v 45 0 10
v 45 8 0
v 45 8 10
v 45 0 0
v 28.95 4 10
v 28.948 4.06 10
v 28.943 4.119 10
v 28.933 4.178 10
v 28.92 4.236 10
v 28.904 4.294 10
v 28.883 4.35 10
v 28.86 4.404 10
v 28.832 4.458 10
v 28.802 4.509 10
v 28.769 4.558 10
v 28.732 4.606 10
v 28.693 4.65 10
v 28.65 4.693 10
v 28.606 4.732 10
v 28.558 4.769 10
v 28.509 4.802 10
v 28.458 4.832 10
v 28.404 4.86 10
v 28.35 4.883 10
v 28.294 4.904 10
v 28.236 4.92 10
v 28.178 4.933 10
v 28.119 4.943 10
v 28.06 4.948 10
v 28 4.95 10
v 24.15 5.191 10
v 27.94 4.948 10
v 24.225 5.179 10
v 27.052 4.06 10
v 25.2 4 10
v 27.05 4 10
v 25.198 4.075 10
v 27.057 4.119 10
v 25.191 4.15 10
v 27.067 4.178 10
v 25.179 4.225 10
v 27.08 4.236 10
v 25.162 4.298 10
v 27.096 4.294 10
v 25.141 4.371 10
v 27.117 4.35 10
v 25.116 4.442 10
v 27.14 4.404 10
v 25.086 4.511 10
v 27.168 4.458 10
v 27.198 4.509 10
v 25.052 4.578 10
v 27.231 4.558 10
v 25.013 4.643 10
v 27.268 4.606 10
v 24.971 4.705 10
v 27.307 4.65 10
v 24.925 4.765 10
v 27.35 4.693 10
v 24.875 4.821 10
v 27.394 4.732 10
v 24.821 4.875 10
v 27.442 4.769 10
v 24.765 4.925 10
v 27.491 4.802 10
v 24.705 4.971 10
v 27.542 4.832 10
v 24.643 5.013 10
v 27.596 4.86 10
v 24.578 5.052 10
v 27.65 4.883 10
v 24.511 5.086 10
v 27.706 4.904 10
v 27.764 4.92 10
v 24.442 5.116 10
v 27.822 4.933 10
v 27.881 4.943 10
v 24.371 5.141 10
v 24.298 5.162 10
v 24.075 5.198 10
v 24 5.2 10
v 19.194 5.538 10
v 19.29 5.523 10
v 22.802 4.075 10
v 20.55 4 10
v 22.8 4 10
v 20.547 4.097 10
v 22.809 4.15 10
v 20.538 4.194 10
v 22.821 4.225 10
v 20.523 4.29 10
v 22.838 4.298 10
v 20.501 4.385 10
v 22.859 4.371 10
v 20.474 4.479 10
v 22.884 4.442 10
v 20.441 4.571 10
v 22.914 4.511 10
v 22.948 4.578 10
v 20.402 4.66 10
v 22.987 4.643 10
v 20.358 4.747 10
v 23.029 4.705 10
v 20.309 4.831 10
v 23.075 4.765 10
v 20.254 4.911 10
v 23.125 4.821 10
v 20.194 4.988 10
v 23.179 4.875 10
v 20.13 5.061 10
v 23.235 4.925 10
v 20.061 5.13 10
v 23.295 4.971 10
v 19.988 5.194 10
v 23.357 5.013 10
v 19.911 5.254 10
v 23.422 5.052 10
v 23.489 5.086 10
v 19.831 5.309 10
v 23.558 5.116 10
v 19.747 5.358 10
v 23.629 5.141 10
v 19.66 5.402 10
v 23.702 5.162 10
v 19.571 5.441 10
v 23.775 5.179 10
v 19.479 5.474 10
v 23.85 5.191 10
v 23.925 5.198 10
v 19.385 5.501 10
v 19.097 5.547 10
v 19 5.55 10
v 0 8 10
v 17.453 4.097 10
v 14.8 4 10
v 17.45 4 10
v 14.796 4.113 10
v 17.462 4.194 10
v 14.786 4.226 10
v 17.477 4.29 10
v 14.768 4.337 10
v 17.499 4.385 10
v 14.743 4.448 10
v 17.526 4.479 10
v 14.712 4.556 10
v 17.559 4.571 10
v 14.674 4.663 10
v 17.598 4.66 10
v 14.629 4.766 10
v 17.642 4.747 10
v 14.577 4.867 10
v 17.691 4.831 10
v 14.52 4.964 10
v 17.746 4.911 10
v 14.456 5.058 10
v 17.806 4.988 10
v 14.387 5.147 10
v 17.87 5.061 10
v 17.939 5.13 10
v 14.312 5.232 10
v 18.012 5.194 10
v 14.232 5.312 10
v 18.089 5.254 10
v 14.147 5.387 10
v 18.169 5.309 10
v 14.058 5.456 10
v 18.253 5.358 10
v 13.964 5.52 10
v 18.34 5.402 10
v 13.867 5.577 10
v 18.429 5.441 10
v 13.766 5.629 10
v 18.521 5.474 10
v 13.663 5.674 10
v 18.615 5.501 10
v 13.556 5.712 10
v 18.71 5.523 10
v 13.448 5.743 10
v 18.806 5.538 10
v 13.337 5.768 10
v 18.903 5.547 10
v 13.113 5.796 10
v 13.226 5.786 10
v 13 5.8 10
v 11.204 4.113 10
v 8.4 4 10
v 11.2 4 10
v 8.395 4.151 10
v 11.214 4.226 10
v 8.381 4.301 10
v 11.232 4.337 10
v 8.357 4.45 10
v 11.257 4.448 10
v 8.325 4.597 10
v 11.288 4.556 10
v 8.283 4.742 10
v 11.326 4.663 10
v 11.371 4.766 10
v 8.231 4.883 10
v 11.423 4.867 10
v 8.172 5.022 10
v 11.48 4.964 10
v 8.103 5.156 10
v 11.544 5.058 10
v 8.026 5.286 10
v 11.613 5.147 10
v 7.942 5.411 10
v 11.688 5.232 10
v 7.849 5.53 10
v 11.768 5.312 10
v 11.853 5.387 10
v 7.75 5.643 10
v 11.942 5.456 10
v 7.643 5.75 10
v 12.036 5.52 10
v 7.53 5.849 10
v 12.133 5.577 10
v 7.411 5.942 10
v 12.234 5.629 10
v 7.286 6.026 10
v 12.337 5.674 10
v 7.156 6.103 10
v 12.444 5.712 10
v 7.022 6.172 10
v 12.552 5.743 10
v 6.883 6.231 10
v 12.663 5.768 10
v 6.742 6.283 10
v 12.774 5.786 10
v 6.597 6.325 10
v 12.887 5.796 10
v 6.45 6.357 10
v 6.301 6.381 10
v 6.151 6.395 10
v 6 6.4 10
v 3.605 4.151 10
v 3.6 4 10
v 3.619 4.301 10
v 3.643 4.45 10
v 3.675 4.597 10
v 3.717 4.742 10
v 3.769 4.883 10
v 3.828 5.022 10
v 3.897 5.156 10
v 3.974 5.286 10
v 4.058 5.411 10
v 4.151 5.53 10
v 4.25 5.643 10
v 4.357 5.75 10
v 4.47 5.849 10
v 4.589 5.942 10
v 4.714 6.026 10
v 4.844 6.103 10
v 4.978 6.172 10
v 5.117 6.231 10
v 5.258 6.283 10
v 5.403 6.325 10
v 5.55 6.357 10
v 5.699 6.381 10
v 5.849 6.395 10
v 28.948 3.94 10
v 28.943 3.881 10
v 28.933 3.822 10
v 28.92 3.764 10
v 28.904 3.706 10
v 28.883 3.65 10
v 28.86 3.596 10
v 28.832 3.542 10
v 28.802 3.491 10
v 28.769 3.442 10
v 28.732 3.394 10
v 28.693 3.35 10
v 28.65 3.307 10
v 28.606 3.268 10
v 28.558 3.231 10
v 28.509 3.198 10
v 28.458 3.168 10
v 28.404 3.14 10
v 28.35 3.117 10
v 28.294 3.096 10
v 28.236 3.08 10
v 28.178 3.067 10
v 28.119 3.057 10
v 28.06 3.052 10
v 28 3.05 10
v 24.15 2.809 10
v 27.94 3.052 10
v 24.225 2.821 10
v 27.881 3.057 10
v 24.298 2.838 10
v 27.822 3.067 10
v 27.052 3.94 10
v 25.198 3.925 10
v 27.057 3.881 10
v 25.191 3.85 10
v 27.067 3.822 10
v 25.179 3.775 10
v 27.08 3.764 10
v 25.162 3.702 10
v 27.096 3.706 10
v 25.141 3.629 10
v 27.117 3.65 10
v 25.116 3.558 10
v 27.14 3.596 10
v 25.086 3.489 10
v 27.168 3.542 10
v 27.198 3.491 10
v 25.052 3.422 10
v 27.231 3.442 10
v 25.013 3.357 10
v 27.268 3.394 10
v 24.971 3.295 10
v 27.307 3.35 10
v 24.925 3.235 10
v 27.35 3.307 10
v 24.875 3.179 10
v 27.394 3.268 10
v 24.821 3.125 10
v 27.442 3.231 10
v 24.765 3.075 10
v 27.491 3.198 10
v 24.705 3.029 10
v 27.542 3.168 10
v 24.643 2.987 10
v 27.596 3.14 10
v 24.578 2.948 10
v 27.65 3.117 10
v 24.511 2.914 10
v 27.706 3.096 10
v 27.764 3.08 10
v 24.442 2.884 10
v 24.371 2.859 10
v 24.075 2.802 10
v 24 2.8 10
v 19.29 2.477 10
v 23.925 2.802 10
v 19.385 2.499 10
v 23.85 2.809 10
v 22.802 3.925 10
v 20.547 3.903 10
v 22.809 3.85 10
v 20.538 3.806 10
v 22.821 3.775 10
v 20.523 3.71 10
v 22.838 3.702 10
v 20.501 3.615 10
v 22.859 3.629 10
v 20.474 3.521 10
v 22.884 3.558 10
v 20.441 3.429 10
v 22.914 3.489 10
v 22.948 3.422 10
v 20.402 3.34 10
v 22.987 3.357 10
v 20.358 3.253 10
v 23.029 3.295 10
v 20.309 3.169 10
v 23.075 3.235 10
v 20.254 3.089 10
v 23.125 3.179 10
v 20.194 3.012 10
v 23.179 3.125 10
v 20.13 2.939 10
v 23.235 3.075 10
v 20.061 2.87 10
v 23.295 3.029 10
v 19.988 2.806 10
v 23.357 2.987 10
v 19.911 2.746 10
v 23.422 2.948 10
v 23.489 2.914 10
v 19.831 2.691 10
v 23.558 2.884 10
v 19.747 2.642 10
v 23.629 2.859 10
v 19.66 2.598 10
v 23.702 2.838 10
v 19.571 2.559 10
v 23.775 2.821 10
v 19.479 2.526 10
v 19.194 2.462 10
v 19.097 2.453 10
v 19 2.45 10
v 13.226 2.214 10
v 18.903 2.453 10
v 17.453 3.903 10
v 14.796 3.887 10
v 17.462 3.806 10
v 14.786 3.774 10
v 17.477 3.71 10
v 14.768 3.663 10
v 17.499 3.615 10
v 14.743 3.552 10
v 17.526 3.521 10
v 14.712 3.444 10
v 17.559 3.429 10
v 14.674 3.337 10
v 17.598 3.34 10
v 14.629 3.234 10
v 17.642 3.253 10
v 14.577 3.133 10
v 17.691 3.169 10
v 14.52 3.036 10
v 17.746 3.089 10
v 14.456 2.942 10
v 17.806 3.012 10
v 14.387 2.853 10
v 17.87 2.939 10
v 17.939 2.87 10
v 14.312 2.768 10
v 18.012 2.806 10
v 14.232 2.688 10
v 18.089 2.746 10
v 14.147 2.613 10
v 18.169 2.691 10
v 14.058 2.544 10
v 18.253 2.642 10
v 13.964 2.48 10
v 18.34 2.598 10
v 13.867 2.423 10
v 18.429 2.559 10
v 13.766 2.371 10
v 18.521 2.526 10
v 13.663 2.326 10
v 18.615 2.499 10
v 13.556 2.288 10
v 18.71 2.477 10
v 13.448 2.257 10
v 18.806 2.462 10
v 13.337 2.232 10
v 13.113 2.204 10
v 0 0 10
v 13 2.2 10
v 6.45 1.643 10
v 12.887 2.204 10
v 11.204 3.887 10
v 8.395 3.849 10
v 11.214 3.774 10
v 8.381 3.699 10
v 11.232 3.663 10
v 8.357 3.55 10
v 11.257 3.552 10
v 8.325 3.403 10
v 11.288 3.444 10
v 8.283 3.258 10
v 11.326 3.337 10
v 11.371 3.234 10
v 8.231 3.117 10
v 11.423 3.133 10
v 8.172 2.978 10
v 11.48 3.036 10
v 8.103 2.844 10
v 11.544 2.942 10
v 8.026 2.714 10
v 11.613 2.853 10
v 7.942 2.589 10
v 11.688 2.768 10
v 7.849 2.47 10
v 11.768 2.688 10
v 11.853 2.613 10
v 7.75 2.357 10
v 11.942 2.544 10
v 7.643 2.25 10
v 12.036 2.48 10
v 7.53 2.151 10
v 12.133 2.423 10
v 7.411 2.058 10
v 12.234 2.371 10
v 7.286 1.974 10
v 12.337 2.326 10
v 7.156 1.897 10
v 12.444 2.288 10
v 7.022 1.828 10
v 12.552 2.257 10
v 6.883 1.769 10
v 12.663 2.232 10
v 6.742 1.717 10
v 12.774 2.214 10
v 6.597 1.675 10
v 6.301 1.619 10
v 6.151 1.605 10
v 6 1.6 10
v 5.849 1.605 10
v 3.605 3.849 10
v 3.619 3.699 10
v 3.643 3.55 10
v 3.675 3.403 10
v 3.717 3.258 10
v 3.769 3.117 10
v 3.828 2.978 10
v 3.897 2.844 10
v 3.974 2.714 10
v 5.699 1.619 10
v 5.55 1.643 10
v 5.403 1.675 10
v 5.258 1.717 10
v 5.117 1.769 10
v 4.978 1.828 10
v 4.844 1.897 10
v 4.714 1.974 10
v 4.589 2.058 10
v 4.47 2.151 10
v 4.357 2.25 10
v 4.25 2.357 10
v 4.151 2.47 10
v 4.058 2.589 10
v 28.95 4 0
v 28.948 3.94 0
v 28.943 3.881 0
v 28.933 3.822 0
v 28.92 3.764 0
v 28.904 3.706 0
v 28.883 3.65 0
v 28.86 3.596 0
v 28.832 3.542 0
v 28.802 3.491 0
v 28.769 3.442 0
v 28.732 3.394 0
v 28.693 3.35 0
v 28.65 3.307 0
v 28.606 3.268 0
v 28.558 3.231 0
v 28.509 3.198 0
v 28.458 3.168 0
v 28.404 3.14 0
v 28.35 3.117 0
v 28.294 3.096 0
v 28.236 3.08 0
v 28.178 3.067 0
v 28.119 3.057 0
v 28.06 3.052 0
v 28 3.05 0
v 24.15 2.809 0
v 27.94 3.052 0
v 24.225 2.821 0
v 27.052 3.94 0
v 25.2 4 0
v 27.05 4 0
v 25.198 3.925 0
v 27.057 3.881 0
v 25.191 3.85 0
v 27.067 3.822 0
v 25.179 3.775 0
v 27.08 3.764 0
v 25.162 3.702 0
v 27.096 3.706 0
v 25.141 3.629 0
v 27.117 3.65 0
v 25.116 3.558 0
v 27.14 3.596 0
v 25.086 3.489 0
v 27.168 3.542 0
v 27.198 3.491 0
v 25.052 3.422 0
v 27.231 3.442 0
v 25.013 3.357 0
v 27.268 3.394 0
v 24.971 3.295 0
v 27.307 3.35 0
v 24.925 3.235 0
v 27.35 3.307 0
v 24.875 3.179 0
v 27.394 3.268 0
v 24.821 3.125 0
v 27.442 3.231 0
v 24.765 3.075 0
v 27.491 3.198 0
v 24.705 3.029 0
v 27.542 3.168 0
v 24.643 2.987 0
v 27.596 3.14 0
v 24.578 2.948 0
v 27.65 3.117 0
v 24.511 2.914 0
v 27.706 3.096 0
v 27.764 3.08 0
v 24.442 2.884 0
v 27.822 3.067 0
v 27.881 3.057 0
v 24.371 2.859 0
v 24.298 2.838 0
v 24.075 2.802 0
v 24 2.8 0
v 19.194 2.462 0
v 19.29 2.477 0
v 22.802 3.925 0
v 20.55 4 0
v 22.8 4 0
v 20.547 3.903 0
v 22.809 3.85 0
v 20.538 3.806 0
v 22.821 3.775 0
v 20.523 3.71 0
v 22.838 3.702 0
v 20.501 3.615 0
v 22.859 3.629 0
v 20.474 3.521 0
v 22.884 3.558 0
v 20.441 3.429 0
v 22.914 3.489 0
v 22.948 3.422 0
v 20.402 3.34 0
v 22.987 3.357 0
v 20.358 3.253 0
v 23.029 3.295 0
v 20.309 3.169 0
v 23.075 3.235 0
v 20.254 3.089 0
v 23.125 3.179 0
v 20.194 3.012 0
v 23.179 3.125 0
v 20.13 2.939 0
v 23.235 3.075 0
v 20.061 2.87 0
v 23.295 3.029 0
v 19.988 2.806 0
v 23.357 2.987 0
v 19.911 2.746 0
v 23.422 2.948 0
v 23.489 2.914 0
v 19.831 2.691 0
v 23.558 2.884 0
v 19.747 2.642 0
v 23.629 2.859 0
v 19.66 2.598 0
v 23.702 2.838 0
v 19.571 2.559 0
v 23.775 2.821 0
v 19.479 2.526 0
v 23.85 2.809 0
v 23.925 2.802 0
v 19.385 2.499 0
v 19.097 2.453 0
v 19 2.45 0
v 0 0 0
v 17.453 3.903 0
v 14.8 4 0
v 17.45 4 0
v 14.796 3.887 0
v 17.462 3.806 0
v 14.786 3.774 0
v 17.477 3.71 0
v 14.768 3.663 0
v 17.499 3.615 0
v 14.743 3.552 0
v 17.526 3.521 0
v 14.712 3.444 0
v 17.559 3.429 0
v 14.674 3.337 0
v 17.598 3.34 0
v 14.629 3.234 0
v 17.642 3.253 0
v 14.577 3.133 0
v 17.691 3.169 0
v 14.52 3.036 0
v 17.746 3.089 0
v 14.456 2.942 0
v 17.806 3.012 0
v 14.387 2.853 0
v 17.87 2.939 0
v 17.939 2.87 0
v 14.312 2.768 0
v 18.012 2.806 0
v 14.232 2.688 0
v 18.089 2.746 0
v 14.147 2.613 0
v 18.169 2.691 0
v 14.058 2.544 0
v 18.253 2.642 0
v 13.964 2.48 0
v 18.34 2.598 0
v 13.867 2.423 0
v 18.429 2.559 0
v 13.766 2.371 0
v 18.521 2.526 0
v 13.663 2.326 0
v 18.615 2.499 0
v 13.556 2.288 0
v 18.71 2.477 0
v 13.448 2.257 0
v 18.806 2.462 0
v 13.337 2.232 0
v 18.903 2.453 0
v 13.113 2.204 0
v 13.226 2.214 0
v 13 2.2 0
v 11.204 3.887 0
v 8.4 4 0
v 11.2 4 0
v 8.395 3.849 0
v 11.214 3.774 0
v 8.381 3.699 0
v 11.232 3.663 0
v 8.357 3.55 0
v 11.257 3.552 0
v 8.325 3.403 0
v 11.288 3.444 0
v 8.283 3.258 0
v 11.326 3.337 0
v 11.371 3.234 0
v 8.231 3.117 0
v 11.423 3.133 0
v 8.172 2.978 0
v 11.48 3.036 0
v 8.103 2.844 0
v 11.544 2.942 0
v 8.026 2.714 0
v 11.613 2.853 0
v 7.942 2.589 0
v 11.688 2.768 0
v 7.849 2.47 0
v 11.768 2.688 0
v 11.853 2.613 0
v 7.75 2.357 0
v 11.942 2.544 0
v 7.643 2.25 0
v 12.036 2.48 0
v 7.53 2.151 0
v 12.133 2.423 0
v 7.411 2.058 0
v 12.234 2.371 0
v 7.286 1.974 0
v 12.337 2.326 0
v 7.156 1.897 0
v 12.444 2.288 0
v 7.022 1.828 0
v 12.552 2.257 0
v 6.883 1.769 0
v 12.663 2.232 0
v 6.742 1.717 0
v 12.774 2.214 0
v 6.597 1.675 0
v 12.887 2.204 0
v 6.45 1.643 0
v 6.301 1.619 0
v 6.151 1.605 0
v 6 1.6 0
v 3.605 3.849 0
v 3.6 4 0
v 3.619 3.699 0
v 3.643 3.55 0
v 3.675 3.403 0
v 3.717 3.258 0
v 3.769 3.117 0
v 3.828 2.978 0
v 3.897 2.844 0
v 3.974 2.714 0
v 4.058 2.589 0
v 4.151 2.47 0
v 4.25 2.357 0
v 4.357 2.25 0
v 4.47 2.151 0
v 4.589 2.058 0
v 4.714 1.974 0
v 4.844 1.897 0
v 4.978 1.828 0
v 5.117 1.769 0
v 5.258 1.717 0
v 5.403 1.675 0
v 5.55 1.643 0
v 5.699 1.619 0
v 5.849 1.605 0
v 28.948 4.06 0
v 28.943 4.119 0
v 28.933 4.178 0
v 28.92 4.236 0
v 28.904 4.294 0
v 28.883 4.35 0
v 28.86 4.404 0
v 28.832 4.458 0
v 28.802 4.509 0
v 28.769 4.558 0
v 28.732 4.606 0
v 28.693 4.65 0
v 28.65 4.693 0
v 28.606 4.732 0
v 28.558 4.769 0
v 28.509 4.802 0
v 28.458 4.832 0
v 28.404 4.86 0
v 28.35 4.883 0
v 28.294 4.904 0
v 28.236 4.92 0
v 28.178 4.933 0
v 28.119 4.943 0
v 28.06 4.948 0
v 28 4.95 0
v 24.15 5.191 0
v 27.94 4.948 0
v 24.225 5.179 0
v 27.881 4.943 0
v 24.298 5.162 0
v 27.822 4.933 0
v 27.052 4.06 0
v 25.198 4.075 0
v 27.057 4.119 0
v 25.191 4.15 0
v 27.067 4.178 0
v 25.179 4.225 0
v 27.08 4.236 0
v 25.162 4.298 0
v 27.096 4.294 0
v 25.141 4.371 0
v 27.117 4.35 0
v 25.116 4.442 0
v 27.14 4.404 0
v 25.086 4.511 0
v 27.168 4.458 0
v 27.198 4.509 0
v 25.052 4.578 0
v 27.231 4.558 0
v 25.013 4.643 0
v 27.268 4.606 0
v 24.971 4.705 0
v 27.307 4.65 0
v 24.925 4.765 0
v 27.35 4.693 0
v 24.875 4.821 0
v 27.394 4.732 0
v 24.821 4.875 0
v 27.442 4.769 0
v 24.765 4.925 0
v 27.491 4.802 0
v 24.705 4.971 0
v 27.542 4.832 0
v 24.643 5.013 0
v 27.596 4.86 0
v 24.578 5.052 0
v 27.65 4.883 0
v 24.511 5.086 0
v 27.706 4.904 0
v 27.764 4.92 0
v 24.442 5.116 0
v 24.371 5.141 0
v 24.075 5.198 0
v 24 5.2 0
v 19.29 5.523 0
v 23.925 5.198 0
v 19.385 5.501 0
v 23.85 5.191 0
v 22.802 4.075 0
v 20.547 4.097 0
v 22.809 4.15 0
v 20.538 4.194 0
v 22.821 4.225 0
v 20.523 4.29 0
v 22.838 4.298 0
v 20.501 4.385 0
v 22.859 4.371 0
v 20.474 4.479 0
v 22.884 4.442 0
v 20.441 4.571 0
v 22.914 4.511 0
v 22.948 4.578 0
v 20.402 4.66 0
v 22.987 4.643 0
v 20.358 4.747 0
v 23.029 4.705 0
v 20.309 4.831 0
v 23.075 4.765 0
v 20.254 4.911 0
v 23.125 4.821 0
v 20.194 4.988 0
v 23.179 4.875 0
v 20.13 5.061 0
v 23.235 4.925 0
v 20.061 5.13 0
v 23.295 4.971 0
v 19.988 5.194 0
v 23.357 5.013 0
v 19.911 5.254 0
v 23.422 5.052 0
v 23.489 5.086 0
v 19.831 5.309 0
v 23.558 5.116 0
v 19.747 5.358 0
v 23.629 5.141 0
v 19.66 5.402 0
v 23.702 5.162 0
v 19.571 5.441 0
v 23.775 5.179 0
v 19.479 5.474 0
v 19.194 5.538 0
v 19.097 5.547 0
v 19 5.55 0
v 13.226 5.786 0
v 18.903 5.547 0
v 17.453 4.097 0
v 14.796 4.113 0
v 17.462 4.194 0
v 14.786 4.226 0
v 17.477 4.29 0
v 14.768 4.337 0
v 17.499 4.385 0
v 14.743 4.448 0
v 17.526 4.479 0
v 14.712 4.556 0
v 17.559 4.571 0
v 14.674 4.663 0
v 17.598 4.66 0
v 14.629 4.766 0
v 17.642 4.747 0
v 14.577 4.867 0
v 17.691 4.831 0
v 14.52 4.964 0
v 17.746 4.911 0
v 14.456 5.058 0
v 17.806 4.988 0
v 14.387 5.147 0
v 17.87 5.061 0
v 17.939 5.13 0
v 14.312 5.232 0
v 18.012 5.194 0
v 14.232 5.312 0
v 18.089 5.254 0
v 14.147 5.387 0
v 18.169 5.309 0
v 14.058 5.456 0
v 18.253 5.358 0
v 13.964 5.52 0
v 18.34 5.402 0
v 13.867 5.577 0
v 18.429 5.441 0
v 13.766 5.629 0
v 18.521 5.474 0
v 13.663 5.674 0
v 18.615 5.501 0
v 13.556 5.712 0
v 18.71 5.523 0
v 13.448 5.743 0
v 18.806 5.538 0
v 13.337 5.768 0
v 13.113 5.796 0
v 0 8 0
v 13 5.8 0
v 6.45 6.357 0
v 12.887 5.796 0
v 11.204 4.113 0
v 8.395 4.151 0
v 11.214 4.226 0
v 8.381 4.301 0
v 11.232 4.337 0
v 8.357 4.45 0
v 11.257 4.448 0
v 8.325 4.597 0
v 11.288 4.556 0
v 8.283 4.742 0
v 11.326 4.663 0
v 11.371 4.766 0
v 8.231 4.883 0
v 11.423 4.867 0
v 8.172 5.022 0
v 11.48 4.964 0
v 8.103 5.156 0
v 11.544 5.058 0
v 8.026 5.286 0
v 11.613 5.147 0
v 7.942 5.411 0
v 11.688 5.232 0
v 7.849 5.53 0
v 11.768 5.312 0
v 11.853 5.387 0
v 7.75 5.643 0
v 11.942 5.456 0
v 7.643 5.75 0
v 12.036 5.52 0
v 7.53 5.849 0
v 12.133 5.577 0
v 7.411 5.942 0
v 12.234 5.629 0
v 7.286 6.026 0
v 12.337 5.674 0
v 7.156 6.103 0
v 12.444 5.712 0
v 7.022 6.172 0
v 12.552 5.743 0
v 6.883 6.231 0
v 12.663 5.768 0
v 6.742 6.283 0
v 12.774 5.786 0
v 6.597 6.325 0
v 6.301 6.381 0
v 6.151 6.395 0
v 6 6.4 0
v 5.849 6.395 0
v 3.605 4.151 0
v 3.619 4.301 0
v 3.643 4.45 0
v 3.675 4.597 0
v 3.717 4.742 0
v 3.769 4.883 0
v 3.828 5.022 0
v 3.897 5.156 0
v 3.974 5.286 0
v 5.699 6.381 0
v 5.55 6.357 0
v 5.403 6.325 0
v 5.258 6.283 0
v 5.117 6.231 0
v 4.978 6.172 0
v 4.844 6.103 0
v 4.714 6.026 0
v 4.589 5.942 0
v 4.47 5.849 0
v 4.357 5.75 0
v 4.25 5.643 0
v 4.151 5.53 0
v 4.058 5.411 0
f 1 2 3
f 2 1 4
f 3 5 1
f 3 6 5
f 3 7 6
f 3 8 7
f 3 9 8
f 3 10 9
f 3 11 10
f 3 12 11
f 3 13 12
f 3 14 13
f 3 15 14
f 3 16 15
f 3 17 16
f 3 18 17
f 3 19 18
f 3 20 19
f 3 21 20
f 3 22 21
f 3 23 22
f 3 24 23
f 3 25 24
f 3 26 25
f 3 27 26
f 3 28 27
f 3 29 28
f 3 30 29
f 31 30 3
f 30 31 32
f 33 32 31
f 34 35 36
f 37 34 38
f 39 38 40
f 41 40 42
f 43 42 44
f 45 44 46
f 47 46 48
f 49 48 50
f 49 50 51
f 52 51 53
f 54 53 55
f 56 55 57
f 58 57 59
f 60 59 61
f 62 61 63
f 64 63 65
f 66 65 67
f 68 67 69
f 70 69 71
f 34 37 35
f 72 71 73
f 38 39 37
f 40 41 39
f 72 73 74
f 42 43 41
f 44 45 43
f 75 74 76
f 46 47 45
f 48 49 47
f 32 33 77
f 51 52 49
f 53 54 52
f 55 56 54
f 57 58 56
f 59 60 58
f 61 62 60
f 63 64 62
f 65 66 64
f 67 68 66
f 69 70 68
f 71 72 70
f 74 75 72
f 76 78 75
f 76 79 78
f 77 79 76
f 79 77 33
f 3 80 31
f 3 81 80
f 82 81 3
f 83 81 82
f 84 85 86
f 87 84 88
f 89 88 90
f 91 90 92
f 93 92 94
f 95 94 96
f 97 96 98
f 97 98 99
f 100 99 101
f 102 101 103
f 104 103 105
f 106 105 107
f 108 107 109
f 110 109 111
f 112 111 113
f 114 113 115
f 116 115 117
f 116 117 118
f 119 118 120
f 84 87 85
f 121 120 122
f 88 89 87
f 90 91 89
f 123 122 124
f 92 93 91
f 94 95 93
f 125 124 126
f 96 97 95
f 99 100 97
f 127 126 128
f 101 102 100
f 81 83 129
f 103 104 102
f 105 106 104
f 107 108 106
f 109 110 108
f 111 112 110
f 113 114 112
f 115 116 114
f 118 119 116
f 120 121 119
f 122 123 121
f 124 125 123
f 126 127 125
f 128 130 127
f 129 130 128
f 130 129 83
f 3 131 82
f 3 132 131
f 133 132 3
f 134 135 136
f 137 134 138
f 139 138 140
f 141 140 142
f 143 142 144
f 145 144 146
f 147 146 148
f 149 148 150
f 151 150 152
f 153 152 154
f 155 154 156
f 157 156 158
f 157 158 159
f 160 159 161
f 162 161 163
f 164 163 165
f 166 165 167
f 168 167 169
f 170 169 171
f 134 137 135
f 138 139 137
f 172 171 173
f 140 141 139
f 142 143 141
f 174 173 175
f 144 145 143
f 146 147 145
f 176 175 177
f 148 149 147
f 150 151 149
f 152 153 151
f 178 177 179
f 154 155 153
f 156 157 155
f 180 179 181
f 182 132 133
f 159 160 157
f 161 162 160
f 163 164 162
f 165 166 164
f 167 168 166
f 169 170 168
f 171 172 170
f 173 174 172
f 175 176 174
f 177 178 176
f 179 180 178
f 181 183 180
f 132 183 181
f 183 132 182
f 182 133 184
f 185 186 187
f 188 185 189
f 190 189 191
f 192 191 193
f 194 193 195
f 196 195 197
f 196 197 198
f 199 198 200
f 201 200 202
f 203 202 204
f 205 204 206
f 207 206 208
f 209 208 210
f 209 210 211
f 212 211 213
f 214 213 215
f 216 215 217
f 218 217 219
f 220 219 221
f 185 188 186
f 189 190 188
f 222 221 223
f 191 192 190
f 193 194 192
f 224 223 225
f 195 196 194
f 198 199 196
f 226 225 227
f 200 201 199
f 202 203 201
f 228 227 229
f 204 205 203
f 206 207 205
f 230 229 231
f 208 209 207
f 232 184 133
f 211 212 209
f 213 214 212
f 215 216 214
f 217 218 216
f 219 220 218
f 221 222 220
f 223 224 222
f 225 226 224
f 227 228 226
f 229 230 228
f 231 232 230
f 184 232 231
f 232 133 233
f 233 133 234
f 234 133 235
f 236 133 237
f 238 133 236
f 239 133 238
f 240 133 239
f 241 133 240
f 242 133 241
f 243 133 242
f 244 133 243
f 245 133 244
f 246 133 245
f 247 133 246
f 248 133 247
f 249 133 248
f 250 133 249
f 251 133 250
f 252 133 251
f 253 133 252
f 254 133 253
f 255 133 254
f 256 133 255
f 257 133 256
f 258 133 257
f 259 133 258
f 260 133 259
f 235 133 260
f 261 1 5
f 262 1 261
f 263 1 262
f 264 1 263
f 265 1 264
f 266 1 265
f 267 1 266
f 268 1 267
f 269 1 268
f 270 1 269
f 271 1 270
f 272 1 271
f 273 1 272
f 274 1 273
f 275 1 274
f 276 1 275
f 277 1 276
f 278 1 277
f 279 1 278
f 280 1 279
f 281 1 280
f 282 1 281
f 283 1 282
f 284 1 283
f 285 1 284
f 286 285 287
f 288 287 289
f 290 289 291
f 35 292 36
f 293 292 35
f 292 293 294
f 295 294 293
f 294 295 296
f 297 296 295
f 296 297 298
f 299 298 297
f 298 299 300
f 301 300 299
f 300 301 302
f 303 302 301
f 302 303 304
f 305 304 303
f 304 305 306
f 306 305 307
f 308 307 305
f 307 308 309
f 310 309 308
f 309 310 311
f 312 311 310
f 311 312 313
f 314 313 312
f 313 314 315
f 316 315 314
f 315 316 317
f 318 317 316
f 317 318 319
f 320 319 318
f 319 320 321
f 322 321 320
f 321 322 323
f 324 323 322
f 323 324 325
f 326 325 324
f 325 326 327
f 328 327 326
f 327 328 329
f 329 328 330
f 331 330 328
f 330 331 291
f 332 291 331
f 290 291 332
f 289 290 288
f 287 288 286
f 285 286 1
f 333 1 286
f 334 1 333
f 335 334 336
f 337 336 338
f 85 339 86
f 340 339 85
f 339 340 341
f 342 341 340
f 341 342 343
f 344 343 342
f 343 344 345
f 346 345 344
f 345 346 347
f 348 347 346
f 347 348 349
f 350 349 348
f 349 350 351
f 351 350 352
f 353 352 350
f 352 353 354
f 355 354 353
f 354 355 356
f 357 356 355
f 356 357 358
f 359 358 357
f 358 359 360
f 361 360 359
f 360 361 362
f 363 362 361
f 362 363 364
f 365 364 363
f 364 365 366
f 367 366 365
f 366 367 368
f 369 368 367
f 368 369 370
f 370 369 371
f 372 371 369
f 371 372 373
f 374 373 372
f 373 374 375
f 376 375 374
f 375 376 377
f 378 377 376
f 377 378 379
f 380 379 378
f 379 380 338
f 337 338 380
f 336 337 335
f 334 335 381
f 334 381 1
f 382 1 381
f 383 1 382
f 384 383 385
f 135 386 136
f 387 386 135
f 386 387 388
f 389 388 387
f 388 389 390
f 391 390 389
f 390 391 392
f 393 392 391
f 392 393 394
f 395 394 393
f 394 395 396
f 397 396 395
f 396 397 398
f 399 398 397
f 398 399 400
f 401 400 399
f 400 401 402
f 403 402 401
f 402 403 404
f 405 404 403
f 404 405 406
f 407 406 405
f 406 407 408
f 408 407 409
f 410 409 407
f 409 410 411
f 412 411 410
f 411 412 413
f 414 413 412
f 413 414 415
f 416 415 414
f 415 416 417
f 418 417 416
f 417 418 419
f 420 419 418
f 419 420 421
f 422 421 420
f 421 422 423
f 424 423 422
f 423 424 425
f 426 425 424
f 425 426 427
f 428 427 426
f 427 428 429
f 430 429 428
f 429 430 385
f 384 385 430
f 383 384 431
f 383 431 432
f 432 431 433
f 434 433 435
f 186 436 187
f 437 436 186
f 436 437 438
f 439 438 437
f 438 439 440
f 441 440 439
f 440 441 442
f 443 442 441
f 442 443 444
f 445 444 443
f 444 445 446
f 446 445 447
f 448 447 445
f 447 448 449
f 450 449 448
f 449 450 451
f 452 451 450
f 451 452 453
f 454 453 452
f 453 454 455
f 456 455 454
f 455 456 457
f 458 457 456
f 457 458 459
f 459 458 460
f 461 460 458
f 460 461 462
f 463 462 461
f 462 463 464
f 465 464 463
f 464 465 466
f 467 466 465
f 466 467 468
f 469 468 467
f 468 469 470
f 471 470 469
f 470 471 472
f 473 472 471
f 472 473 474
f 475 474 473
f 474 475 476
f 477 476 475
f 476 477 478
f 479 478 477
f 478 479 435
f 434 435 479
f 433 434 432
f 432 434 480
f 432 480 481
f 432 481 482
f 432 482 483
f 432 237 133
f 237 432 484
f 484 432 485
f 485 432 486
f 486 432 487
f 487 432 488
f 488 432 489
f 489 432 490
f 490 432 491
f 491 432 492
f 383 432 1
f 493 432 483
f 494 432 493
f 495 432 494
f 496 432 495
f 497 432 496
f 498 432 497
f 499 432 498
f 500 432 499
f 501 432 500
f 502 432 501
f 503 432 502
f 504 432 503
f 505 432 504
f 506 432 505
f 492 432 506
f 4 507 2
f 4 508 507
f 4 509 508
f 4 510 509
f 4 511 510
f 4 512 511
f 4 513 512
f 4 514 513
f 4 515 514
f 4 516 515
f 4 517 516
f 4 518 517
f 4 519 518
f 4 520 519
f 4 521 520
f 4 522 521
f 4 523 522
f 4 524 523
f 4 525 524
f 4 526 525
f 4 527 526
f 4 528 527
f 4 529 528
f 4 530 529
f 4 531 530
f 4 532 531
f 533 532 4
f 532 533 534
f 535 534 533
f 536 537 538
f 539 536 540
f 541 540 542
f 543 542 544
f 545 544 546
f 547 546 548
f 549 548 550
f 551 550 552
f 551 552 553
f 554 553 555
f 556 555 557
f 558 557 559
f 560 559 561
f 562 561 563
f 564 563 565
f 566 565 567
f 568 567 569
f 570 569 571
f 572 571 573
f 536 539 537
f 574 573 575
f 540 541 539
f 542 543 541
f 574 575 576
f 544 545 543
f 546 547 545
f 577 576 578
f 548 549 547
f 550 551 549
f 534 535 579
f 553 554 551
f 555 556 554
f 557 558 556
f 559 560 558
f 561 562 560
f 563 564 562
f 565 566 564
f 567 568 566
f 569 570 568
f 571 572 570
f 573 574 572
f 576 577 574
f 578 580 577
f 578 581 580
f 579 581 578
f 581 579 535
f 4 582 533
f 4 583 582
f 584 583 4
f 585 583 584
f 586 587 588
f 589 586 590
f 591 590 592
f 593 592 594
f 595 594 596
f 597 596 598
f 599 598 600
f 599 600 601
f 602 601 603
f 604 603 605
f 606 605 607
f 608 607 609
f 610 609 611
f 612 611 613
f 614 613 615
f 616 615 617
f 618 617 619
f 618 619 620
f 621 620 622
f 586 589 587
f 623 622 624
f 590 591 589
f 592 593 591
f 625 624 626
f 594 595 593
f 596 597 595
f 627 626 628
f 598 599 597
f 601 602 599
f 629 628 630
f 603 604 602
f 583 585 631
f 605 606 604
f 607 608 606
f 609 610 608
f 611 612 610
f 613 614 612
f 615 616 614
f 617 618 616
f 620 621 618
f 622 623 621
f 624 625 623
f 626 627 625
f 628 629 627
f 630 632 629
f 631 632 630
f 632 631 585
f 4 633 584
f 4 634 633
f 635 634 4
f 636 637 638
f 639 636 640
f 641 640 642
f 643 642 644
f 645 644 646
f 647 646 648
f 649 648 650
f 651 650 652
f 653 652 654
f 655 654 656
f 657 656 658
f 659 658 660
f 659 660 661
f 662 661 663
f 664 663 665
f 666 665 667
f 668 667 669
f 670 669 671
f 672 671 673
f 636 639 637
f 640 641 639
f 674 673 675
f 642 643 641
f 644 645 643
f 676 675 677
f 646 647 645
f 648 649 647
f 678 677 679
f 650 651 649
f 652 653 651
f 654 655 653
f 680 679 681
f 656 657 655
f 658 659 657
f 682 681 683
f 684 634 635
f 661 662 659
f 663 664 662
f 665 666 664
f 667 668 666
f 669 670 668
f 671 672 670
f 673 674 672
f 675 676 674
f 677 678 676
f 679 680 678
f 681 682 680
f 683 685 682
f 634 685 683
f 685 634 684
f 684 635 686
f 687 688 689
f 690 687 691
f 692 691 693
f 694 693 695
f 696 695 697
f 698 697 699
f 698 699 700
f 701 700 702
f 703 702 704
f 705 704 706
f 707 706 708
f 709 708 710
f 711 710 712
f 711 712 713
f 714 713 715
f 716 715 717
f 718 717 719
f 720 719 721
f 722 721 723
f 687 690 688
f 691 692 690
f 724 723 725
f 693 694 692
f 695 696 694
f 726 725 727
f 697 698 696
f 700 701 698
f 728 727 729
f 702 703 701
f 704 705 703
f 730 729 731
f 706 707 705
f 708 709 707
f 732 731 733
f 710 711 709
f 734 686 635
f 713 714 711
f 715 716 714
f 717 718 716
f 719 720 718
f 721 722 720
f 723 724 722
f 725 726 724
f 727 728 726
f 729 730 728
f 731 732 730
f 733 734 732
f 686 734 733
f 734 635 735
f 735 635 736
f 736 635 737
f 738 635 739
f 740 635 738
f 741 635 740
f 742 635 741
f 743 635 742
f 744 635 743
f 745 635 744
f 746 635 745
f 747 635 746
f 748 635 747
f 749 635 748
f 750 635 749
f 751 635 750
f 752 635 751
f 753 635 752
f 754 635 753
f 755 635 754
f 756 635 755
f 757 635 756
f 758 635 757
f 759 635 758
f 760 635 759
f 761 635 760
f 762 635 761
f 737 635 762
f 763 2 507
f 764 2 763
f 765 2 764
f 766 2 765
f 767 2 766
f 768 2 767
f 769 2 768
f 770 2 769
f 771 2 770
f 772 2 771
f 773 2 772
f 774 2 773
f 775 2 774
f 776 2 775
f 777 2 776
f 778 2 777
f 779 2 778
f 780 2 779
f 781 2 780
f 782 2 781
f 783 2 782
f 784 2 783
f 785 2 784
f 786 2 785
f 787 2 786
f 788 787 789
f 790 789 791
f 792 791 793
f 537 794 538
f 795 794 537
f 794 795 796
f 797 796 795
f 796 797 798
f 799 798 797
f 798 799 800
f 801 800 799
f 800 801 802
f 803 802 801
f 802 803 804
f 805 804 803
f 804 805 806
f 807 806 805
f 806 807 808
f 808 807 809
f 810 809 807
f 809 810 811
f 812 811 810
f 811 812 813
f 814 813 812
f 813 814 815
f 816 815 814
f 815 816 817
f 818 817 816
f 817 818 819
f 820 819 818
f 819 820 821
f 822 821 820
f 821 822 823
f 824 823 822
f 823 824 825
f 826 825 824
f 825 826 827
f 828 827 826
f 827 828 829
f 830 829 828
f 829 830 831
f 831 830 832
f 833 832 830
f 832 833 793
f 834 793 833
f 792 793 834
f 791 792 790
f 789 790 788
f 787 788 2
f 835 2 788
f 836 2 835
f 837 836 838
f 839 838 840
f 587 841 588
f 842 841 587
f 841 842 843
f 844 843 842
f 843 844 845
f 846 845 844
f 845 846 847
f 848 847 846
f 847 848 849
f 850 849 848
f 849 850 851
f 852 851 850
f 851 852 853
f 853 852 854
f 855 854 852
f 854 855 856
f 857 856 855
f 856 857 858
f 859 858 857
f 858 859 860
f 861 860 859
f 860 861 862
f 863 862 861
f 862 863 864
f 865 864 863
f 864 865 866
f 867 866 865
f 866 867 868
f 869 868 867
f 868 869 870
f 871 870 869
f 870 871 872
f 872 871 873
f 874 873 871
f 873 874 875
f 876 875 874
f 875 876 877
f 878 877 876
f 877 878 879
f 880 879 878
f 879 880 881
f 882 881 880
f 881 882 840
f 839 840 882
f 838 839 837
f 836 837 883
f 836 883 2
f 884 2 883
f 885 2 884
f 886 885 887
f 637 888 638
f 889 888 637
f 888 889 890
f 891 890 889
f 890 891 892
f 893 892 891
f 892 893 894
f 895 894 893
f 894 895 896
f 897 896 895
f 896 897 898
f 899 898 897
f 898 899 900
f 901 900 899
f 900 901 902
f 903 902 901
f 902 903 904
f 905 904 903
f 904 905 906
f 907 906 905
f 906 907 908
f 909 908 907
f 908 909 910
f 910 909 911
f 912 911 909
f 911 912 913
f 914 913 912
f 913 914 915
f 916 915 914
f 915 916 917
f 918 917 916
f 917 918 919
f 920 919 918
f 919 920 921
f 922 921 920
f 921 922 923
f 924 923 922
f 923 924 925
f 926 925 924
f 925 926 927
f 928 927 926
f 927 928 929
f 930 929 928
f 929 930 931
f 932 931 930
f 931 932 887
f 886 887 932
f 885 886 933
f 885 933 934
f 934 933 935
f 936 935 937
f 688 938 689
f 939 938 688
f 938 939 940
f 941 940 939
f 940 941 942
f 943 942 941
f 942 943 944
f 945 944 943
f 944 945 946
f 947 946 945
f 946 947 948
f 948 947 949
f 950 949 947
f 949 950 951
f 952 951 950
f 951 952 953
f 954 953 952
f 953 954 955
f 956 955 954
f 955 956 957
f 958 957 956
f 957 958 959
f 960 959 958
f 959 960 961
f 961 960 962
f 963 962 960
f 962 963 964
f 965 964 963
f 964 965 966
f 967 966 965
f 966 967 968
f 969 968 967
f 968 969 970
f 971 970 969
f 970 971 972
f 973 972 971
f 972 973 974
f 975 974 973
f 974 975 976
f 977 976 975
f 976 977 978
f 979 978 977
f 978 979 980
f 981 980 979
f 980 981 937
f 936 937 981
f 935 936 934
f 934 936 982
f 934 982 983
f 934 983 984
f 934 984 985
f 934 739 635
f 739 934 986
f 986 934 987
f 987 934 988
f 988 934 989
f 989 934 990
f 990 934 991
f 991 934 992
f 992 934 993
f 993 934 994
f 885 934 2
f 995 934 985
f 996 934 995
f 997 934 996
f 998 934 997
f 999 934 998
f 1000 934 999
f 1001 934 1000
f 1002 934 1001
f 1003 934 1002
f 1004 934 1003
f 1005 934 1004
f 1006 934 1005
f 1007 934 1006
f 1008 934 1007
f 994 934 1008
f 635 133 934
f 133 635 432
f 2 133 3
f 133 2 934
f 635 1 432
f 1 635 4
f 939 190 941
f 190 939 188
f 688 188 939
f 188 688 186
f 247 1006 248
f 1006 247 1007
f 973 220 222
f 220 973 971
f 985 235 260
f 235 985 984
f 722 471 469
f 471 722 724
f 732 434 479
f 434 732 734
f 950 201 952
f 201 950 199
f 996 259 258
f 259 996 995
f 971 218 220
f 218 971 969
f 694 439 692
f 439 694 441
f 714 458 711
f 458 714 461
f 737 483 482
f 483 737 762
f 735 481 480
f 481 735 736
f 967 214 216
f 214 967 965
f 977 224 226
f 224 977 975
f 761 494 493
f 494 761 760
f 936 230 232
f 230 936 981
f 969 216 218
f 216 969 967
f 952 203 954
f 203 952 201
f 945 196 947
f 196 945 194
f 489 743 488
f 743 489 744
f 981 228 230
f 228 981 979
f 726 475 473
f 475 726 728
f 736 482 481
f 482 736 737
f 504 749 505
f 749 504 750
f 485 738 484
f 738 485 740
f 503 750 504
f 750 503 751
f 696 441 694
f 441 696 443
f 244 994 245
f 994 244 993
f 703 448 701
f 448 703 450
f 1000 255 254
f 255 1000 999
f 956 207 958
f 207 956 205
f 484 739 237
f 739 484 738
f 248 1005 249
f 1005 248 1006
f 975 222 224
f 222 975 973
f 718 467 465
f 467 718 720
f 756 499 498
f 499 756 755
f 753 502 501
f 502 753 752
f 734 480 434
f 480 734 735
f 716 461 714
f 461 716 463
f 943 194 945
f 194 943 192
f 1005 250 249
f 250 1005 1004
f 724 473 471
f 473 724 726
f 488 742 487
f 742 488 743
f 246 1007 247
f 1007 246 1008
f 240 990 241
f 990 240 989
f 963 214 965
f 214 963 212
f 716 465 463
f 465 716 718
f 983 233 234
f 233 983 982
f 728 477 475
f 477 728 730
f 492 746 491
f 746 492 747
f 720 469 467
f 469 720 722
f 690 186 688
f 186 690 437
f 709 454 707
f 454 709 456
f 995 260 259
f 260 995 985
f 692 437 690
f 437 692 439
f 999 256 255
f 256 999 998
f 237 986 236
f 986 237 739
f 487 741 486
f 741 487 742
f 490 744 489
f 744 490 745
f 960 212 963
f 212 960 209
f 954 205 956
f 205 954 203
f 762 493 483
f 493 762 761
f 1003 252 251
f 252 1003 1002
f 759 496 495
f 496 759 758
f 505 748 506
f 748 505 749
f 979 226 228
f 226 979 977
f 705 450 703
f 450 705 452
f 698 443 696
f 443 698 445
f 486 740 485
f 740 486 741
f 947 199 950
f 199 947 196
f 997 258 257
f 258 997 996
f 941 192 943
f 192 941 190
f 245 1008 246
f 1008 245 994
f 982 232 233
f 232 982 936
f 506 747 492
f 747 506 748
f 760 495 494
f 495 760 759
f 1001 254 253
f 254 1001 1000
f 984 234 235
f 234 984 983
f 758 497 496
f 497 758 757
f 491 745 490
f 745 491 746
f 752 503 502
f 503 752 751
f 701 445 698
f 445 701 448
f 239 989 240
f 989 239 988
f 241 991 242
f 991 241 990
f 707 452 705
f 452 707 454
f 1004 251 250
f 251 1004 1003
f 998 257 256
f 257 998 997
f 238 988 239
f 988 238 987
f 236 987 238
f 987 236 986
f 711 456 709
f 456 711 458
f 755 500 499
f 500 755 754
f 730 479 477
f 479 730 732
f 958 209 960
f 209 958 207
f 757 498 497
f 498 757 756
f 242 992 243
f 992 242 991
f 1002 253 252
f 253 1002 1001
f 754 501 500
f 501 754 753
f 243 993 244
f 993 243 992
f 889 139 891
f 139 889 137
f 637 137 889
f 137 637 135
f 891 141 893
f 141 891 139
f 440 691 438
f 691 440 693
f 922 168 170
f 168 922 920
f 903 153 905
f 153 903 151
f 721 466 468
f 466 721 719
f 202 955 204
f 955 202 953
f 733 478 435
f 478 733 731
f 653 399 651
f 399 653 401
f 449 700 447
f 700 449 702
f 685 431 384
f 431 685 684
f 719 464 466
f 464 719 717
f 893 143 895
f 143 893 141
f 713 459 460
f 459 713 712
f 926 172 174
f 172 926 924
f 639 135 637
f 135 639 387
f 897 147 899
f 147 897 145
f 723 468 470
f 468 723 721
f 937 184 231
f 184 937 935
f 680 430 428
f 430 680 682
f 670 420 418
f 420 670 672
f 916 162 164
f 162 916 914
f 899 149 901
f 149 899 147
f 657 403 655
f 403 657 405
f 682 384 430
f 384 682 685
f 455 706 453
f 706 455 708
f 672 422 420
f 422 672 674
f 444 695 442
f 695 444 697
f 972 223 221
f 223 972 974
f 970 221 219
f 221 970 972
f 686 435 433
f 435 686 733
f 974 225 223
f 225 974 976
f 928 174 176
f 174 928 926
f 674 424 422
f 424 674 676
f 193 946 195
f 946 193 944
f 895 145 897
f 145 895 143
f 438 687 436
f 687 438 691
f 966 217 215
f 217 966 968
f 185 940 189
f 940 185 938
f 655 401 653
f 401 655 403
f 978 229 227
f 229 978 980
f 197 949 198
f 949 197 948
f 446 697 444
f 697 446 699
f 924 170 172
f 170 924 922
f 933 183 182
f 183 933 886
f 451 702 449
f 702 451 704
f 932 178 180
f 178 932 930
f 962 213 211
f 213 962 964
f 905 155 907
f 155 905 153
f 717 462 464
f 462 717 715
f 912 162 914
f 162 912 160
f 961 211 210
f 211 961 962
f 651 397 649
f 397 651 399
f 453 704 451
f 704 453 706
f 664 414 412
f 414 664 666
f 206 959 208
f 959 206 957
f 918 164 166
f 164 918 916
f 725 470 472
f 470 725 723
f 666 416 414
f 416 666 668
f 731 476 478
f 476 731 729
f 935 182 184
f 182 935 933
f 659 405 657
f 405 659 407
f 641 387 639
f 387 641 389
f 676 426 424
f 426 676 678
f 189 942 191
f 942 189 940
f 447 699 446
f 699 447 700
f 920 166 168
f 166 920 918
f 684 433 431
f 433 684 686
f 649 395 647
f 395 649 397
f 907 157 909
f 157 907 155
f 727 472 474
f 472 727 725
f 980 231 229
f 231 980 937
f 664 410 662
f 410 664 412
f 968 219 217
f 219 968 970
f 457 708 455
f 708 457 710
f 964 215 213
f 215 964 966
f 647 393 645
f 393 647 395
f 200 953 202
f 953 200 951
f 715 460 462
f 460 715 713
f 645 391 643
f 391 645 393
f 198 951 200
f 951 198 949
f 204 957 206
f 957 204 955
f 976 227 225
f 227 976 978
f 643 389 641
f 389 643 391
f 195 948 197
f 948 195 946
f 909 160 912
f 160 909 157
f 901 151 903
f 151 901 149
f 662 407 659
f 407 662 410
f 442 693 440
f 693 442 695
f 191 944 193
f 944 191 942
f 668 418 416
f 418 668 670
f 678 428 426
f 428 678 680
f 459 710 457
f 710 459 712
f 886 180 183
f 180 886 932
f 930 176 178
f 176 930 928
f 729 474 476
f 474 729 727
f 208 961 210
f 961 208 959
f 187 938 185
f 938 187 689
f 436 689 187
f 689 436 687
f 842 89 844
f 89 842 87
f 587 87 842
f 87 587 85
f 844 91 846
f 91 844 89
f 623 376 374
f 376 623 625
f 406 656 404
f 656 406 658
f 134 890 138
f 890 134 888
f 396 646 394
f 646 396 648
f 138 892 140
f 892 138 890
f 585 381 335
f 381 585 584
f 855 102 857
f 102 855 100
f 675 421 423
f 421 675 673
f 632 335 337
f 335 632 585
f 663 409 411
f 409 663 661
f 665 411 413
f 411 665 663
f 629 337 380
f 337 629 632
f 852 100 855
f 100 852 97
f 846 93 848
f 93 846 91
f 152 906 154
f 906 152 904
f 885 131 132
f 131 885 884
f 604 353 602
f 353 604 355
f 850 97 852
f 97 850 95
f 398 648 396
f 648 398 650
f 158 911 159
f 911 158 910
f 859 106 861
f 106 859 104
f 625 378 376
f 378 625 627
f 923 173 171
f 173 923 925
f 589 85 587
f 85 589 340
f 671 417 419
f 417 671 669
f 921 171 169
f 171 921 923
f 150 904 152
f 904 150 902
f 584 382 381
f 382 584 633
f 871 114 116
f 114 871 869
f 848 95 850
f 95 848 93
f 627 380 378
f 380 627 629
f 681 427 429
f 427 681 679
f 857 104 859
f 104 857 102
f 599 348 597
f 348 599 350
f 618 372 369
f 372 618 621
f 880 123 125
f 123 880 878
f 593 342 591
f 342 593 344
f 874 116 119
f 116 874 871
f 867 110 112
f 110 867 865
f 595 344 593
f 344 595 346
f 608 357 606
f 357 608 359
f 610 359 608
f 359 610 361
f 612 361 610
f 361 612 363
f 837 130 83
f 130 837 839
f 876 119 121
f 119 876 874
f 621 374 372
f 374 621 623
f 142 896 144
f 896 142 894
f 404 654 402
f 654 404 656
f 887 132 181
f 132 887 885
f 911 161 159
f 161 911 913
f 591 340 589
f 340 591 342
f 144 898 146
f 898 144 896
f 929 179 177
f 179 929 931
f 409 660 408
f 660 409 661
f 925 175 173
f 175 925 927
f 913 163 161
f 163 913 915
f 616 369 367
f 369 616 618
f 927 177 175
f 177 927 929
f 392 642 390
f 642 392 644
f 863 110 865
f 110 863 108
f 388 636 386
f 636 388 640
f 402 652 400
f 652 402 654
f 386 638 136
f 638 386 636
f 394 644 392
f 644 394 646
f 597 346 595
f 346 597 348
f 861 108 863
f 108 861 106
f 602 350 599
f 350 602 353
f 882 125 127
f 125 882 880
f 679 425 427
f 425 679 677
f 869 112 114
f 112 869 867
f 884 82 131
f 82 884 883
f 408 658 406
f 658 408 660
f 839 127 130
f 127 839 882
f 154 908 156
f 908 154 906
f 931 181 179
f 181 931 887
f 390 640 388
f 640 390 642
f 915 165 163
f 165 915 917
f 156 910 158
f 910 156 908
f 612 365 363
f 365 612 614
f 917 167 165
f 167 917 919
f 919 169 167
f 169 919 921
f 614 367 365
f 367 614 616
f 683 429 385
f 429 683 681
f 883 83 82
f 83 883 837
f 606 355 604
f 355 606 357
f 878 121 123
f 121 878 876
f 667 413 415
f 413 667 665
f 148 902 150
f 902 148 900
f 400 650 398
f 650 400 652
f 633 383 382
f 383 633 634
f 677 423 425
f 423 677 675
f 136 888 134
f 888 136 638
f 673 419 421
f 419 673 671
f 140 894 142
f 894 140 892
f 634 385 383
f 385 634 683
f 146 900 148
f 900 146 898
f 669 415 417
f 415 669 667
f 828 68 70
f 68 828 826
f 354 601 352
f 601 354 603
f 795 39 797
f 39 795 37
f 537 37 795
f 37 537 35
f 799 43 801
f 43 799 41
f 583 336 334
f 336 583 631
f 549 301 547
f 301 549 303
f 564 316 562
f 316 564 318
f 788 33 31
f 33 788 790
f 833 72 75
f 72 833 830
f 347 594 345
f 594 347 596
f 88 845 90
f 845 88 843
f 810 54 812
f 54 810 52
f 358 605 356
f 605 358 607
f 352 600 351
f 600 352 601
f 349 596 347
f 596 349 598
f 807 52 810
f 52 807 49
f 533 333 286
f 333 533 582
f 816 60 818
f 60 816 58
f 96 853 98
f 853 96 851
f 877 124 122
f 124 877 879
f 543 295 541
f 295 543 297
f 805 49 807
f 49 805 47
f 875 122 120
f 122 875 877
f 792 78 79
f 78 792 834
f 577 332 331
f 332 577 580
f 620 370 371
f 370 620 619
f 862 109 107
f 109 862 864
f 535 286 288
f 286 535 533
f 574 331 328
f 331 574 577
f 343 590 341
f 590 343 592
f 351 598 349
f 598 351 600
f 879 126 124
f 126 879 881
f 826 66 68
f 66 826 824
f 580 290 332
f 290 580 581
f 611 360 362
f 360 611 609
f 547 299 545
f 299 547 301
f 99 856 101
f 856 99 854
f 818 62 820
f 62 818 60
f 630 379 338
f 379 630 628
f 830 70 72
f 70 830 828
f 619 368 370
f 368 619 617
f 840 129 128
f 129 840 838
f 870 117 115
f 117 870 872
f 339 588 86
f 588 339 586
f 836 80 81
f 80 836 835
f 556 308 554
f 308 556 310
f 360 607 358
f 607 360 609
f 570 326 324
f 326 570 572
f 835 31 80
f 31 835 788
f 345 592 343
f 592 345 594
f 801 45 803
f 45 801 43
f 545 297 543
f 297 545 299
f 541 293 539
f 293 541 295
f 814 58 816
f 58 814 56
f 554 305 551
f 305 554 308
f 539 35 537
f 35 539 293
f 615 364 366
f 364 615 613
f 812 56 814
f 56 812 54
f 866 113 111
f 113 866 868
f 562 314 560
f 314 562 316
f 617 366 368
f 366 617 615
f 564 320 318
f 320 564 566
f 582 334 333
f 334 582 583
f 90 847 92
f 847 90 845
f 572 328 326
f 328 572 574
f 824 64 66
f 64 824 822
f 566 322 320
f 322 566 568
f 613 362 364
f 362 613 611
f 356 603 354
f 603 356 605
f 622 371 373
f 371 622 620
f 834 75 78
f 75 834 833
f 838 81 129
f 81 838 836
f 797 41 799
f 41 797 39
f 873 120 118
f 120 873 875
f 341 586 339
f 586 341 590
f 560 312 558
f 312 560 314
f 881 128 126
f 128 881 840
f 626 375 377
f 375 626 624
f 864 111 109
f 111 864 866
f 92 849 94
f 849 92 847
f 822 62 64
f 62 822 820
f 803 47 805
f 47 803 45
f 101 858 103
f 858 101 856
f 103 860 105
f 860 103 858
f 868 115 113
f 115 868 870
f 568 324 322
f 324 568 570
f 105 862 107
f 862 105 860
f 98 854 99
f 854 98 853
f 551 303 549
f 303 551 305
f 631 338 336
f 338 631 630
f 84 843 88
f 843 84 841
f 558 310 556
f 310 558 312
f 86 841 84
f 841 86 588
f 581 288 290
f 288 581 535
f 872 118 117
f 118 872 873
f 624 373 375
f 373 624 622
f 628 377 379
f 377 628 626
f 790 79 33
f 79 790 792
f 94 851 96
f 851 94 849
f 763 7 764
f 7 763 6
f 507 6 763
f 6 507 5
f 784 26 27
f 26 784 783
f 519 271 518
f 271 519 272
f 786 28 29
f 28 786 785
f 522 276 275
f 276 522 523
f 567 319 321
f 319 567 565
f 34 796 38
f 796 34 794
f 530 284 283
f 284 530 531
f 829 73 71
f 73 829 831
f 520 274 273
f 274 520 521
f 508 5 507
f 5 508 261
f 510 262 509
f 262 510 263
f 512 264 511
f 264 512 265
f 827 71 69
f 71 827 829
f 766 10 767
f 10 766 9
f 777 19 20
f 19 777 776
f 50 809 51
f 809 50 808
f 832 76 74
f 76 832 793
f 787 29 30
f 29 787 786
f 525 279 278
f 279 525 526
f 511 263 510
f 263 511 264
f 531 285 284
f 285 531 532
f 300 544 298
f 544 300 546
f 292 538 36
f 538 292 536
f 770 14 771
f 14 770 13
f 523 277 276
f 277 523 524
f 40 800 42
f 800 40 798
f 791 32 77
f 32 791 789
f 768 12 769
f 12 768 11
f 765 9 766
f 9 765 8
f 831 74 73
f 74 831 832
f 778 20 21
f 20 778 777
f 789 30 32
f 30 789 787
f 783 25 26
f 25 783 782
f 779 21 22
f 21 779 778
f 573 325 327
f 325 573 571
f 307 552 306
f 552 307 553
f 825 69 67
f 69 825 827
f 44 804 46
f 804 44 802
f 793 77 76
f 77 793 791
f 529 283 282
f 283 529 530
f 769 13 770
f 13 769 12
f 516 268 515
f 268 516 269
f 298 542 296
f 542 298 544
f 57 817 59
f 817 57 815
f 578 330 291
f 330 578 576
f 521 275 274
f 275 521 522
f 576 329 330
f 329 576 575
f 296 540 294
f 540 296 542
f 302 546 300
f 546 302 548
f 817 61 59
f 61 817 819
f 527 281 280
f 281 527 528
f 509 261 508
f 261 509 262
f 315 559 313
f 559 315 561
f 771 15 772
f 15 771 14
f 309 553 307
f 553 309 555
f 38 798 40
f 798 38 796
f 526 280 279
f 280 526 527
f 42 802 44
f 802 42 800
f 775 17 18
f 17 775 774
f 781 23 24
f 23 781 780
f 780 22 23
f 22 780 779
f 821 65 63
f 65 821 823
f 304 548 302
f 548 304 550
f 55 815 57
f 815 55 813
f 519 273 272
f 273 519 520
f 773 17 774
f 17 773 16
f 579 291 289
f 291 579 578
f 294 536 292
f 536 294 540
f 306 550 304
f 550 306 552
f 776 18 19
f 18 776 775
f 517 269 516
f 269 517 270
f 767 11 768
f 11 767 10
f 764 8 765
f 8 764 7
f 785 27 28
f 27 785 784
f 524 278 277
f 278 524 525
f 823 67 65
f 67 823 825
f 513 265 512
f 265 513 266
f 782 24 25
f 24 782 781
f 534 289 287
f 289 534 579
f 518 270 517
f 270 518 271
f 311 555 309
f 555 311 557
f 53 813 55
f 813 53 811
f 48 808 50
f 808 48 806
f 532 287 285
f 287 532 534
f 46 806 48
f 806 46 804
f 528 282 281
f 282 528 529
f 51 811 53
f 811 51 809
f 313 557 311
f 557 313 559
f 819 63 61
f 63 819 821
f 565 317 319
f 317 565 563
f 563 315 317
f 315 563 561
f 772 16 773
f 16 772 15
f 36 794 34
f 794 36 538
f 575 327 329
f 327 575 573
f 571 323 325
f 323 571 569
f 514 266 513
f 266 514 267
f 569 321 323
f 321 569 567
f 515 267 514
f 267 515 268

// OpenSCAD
width = 45;
length = 8;
height = 10;

holes = [6, 13, 19, 24, 28];

difference() {
    cube([width,length,height]);
    translate([holes[0], length / 2, -1])
        cylinder(h=height + 2, d=4.8, $fn=100);
    translate([holes[1], length / 2, -1])
        cylinder(h=height + 2, d=3.6, $fn=100);
    translate([holes[2], length / 2, -1])
        cylinder(h=height + 2, d=3.1, $fn=100);
    translate([holes[3], length / 2, -1])
        cylinder(h=height + 2, d=2.4, $fn=100);
    translate([holes[4], length / 2, -1])
        cylinder(h=height + 2, d=1.9, $fn=100);
}

/*
translate([0, height + 10, 0]) {

wallThickness = 5;
spacing = 7.5;

difference() {
    cube([width,length,height]);
    translate([wallThickness + 7.5 * 1, length / 2, -1])
        cylinder(h=height + 2, d=4.1, $fn=100);
    translate([wallThickness + 7.5 * 2, length / 2, -1])
        cylinder(h=height + 2, d=3.1, $fn=100);
    translate([wallThickness + 7.5 * 3, length / 2, -1])
        cylinder(h=height + 2, d=2.6, $fn=100);
    translate([wallThickness + 7.5 * 4, length / 2, -1])
        cylinder(h=height + 2, d=2.1, $fn=100);
    translate([wallThickness + 7.5 * 5, length / 2, -1])
        cylinder(h=height + 2, d=1.6, $fn=100);
}

}
*/
